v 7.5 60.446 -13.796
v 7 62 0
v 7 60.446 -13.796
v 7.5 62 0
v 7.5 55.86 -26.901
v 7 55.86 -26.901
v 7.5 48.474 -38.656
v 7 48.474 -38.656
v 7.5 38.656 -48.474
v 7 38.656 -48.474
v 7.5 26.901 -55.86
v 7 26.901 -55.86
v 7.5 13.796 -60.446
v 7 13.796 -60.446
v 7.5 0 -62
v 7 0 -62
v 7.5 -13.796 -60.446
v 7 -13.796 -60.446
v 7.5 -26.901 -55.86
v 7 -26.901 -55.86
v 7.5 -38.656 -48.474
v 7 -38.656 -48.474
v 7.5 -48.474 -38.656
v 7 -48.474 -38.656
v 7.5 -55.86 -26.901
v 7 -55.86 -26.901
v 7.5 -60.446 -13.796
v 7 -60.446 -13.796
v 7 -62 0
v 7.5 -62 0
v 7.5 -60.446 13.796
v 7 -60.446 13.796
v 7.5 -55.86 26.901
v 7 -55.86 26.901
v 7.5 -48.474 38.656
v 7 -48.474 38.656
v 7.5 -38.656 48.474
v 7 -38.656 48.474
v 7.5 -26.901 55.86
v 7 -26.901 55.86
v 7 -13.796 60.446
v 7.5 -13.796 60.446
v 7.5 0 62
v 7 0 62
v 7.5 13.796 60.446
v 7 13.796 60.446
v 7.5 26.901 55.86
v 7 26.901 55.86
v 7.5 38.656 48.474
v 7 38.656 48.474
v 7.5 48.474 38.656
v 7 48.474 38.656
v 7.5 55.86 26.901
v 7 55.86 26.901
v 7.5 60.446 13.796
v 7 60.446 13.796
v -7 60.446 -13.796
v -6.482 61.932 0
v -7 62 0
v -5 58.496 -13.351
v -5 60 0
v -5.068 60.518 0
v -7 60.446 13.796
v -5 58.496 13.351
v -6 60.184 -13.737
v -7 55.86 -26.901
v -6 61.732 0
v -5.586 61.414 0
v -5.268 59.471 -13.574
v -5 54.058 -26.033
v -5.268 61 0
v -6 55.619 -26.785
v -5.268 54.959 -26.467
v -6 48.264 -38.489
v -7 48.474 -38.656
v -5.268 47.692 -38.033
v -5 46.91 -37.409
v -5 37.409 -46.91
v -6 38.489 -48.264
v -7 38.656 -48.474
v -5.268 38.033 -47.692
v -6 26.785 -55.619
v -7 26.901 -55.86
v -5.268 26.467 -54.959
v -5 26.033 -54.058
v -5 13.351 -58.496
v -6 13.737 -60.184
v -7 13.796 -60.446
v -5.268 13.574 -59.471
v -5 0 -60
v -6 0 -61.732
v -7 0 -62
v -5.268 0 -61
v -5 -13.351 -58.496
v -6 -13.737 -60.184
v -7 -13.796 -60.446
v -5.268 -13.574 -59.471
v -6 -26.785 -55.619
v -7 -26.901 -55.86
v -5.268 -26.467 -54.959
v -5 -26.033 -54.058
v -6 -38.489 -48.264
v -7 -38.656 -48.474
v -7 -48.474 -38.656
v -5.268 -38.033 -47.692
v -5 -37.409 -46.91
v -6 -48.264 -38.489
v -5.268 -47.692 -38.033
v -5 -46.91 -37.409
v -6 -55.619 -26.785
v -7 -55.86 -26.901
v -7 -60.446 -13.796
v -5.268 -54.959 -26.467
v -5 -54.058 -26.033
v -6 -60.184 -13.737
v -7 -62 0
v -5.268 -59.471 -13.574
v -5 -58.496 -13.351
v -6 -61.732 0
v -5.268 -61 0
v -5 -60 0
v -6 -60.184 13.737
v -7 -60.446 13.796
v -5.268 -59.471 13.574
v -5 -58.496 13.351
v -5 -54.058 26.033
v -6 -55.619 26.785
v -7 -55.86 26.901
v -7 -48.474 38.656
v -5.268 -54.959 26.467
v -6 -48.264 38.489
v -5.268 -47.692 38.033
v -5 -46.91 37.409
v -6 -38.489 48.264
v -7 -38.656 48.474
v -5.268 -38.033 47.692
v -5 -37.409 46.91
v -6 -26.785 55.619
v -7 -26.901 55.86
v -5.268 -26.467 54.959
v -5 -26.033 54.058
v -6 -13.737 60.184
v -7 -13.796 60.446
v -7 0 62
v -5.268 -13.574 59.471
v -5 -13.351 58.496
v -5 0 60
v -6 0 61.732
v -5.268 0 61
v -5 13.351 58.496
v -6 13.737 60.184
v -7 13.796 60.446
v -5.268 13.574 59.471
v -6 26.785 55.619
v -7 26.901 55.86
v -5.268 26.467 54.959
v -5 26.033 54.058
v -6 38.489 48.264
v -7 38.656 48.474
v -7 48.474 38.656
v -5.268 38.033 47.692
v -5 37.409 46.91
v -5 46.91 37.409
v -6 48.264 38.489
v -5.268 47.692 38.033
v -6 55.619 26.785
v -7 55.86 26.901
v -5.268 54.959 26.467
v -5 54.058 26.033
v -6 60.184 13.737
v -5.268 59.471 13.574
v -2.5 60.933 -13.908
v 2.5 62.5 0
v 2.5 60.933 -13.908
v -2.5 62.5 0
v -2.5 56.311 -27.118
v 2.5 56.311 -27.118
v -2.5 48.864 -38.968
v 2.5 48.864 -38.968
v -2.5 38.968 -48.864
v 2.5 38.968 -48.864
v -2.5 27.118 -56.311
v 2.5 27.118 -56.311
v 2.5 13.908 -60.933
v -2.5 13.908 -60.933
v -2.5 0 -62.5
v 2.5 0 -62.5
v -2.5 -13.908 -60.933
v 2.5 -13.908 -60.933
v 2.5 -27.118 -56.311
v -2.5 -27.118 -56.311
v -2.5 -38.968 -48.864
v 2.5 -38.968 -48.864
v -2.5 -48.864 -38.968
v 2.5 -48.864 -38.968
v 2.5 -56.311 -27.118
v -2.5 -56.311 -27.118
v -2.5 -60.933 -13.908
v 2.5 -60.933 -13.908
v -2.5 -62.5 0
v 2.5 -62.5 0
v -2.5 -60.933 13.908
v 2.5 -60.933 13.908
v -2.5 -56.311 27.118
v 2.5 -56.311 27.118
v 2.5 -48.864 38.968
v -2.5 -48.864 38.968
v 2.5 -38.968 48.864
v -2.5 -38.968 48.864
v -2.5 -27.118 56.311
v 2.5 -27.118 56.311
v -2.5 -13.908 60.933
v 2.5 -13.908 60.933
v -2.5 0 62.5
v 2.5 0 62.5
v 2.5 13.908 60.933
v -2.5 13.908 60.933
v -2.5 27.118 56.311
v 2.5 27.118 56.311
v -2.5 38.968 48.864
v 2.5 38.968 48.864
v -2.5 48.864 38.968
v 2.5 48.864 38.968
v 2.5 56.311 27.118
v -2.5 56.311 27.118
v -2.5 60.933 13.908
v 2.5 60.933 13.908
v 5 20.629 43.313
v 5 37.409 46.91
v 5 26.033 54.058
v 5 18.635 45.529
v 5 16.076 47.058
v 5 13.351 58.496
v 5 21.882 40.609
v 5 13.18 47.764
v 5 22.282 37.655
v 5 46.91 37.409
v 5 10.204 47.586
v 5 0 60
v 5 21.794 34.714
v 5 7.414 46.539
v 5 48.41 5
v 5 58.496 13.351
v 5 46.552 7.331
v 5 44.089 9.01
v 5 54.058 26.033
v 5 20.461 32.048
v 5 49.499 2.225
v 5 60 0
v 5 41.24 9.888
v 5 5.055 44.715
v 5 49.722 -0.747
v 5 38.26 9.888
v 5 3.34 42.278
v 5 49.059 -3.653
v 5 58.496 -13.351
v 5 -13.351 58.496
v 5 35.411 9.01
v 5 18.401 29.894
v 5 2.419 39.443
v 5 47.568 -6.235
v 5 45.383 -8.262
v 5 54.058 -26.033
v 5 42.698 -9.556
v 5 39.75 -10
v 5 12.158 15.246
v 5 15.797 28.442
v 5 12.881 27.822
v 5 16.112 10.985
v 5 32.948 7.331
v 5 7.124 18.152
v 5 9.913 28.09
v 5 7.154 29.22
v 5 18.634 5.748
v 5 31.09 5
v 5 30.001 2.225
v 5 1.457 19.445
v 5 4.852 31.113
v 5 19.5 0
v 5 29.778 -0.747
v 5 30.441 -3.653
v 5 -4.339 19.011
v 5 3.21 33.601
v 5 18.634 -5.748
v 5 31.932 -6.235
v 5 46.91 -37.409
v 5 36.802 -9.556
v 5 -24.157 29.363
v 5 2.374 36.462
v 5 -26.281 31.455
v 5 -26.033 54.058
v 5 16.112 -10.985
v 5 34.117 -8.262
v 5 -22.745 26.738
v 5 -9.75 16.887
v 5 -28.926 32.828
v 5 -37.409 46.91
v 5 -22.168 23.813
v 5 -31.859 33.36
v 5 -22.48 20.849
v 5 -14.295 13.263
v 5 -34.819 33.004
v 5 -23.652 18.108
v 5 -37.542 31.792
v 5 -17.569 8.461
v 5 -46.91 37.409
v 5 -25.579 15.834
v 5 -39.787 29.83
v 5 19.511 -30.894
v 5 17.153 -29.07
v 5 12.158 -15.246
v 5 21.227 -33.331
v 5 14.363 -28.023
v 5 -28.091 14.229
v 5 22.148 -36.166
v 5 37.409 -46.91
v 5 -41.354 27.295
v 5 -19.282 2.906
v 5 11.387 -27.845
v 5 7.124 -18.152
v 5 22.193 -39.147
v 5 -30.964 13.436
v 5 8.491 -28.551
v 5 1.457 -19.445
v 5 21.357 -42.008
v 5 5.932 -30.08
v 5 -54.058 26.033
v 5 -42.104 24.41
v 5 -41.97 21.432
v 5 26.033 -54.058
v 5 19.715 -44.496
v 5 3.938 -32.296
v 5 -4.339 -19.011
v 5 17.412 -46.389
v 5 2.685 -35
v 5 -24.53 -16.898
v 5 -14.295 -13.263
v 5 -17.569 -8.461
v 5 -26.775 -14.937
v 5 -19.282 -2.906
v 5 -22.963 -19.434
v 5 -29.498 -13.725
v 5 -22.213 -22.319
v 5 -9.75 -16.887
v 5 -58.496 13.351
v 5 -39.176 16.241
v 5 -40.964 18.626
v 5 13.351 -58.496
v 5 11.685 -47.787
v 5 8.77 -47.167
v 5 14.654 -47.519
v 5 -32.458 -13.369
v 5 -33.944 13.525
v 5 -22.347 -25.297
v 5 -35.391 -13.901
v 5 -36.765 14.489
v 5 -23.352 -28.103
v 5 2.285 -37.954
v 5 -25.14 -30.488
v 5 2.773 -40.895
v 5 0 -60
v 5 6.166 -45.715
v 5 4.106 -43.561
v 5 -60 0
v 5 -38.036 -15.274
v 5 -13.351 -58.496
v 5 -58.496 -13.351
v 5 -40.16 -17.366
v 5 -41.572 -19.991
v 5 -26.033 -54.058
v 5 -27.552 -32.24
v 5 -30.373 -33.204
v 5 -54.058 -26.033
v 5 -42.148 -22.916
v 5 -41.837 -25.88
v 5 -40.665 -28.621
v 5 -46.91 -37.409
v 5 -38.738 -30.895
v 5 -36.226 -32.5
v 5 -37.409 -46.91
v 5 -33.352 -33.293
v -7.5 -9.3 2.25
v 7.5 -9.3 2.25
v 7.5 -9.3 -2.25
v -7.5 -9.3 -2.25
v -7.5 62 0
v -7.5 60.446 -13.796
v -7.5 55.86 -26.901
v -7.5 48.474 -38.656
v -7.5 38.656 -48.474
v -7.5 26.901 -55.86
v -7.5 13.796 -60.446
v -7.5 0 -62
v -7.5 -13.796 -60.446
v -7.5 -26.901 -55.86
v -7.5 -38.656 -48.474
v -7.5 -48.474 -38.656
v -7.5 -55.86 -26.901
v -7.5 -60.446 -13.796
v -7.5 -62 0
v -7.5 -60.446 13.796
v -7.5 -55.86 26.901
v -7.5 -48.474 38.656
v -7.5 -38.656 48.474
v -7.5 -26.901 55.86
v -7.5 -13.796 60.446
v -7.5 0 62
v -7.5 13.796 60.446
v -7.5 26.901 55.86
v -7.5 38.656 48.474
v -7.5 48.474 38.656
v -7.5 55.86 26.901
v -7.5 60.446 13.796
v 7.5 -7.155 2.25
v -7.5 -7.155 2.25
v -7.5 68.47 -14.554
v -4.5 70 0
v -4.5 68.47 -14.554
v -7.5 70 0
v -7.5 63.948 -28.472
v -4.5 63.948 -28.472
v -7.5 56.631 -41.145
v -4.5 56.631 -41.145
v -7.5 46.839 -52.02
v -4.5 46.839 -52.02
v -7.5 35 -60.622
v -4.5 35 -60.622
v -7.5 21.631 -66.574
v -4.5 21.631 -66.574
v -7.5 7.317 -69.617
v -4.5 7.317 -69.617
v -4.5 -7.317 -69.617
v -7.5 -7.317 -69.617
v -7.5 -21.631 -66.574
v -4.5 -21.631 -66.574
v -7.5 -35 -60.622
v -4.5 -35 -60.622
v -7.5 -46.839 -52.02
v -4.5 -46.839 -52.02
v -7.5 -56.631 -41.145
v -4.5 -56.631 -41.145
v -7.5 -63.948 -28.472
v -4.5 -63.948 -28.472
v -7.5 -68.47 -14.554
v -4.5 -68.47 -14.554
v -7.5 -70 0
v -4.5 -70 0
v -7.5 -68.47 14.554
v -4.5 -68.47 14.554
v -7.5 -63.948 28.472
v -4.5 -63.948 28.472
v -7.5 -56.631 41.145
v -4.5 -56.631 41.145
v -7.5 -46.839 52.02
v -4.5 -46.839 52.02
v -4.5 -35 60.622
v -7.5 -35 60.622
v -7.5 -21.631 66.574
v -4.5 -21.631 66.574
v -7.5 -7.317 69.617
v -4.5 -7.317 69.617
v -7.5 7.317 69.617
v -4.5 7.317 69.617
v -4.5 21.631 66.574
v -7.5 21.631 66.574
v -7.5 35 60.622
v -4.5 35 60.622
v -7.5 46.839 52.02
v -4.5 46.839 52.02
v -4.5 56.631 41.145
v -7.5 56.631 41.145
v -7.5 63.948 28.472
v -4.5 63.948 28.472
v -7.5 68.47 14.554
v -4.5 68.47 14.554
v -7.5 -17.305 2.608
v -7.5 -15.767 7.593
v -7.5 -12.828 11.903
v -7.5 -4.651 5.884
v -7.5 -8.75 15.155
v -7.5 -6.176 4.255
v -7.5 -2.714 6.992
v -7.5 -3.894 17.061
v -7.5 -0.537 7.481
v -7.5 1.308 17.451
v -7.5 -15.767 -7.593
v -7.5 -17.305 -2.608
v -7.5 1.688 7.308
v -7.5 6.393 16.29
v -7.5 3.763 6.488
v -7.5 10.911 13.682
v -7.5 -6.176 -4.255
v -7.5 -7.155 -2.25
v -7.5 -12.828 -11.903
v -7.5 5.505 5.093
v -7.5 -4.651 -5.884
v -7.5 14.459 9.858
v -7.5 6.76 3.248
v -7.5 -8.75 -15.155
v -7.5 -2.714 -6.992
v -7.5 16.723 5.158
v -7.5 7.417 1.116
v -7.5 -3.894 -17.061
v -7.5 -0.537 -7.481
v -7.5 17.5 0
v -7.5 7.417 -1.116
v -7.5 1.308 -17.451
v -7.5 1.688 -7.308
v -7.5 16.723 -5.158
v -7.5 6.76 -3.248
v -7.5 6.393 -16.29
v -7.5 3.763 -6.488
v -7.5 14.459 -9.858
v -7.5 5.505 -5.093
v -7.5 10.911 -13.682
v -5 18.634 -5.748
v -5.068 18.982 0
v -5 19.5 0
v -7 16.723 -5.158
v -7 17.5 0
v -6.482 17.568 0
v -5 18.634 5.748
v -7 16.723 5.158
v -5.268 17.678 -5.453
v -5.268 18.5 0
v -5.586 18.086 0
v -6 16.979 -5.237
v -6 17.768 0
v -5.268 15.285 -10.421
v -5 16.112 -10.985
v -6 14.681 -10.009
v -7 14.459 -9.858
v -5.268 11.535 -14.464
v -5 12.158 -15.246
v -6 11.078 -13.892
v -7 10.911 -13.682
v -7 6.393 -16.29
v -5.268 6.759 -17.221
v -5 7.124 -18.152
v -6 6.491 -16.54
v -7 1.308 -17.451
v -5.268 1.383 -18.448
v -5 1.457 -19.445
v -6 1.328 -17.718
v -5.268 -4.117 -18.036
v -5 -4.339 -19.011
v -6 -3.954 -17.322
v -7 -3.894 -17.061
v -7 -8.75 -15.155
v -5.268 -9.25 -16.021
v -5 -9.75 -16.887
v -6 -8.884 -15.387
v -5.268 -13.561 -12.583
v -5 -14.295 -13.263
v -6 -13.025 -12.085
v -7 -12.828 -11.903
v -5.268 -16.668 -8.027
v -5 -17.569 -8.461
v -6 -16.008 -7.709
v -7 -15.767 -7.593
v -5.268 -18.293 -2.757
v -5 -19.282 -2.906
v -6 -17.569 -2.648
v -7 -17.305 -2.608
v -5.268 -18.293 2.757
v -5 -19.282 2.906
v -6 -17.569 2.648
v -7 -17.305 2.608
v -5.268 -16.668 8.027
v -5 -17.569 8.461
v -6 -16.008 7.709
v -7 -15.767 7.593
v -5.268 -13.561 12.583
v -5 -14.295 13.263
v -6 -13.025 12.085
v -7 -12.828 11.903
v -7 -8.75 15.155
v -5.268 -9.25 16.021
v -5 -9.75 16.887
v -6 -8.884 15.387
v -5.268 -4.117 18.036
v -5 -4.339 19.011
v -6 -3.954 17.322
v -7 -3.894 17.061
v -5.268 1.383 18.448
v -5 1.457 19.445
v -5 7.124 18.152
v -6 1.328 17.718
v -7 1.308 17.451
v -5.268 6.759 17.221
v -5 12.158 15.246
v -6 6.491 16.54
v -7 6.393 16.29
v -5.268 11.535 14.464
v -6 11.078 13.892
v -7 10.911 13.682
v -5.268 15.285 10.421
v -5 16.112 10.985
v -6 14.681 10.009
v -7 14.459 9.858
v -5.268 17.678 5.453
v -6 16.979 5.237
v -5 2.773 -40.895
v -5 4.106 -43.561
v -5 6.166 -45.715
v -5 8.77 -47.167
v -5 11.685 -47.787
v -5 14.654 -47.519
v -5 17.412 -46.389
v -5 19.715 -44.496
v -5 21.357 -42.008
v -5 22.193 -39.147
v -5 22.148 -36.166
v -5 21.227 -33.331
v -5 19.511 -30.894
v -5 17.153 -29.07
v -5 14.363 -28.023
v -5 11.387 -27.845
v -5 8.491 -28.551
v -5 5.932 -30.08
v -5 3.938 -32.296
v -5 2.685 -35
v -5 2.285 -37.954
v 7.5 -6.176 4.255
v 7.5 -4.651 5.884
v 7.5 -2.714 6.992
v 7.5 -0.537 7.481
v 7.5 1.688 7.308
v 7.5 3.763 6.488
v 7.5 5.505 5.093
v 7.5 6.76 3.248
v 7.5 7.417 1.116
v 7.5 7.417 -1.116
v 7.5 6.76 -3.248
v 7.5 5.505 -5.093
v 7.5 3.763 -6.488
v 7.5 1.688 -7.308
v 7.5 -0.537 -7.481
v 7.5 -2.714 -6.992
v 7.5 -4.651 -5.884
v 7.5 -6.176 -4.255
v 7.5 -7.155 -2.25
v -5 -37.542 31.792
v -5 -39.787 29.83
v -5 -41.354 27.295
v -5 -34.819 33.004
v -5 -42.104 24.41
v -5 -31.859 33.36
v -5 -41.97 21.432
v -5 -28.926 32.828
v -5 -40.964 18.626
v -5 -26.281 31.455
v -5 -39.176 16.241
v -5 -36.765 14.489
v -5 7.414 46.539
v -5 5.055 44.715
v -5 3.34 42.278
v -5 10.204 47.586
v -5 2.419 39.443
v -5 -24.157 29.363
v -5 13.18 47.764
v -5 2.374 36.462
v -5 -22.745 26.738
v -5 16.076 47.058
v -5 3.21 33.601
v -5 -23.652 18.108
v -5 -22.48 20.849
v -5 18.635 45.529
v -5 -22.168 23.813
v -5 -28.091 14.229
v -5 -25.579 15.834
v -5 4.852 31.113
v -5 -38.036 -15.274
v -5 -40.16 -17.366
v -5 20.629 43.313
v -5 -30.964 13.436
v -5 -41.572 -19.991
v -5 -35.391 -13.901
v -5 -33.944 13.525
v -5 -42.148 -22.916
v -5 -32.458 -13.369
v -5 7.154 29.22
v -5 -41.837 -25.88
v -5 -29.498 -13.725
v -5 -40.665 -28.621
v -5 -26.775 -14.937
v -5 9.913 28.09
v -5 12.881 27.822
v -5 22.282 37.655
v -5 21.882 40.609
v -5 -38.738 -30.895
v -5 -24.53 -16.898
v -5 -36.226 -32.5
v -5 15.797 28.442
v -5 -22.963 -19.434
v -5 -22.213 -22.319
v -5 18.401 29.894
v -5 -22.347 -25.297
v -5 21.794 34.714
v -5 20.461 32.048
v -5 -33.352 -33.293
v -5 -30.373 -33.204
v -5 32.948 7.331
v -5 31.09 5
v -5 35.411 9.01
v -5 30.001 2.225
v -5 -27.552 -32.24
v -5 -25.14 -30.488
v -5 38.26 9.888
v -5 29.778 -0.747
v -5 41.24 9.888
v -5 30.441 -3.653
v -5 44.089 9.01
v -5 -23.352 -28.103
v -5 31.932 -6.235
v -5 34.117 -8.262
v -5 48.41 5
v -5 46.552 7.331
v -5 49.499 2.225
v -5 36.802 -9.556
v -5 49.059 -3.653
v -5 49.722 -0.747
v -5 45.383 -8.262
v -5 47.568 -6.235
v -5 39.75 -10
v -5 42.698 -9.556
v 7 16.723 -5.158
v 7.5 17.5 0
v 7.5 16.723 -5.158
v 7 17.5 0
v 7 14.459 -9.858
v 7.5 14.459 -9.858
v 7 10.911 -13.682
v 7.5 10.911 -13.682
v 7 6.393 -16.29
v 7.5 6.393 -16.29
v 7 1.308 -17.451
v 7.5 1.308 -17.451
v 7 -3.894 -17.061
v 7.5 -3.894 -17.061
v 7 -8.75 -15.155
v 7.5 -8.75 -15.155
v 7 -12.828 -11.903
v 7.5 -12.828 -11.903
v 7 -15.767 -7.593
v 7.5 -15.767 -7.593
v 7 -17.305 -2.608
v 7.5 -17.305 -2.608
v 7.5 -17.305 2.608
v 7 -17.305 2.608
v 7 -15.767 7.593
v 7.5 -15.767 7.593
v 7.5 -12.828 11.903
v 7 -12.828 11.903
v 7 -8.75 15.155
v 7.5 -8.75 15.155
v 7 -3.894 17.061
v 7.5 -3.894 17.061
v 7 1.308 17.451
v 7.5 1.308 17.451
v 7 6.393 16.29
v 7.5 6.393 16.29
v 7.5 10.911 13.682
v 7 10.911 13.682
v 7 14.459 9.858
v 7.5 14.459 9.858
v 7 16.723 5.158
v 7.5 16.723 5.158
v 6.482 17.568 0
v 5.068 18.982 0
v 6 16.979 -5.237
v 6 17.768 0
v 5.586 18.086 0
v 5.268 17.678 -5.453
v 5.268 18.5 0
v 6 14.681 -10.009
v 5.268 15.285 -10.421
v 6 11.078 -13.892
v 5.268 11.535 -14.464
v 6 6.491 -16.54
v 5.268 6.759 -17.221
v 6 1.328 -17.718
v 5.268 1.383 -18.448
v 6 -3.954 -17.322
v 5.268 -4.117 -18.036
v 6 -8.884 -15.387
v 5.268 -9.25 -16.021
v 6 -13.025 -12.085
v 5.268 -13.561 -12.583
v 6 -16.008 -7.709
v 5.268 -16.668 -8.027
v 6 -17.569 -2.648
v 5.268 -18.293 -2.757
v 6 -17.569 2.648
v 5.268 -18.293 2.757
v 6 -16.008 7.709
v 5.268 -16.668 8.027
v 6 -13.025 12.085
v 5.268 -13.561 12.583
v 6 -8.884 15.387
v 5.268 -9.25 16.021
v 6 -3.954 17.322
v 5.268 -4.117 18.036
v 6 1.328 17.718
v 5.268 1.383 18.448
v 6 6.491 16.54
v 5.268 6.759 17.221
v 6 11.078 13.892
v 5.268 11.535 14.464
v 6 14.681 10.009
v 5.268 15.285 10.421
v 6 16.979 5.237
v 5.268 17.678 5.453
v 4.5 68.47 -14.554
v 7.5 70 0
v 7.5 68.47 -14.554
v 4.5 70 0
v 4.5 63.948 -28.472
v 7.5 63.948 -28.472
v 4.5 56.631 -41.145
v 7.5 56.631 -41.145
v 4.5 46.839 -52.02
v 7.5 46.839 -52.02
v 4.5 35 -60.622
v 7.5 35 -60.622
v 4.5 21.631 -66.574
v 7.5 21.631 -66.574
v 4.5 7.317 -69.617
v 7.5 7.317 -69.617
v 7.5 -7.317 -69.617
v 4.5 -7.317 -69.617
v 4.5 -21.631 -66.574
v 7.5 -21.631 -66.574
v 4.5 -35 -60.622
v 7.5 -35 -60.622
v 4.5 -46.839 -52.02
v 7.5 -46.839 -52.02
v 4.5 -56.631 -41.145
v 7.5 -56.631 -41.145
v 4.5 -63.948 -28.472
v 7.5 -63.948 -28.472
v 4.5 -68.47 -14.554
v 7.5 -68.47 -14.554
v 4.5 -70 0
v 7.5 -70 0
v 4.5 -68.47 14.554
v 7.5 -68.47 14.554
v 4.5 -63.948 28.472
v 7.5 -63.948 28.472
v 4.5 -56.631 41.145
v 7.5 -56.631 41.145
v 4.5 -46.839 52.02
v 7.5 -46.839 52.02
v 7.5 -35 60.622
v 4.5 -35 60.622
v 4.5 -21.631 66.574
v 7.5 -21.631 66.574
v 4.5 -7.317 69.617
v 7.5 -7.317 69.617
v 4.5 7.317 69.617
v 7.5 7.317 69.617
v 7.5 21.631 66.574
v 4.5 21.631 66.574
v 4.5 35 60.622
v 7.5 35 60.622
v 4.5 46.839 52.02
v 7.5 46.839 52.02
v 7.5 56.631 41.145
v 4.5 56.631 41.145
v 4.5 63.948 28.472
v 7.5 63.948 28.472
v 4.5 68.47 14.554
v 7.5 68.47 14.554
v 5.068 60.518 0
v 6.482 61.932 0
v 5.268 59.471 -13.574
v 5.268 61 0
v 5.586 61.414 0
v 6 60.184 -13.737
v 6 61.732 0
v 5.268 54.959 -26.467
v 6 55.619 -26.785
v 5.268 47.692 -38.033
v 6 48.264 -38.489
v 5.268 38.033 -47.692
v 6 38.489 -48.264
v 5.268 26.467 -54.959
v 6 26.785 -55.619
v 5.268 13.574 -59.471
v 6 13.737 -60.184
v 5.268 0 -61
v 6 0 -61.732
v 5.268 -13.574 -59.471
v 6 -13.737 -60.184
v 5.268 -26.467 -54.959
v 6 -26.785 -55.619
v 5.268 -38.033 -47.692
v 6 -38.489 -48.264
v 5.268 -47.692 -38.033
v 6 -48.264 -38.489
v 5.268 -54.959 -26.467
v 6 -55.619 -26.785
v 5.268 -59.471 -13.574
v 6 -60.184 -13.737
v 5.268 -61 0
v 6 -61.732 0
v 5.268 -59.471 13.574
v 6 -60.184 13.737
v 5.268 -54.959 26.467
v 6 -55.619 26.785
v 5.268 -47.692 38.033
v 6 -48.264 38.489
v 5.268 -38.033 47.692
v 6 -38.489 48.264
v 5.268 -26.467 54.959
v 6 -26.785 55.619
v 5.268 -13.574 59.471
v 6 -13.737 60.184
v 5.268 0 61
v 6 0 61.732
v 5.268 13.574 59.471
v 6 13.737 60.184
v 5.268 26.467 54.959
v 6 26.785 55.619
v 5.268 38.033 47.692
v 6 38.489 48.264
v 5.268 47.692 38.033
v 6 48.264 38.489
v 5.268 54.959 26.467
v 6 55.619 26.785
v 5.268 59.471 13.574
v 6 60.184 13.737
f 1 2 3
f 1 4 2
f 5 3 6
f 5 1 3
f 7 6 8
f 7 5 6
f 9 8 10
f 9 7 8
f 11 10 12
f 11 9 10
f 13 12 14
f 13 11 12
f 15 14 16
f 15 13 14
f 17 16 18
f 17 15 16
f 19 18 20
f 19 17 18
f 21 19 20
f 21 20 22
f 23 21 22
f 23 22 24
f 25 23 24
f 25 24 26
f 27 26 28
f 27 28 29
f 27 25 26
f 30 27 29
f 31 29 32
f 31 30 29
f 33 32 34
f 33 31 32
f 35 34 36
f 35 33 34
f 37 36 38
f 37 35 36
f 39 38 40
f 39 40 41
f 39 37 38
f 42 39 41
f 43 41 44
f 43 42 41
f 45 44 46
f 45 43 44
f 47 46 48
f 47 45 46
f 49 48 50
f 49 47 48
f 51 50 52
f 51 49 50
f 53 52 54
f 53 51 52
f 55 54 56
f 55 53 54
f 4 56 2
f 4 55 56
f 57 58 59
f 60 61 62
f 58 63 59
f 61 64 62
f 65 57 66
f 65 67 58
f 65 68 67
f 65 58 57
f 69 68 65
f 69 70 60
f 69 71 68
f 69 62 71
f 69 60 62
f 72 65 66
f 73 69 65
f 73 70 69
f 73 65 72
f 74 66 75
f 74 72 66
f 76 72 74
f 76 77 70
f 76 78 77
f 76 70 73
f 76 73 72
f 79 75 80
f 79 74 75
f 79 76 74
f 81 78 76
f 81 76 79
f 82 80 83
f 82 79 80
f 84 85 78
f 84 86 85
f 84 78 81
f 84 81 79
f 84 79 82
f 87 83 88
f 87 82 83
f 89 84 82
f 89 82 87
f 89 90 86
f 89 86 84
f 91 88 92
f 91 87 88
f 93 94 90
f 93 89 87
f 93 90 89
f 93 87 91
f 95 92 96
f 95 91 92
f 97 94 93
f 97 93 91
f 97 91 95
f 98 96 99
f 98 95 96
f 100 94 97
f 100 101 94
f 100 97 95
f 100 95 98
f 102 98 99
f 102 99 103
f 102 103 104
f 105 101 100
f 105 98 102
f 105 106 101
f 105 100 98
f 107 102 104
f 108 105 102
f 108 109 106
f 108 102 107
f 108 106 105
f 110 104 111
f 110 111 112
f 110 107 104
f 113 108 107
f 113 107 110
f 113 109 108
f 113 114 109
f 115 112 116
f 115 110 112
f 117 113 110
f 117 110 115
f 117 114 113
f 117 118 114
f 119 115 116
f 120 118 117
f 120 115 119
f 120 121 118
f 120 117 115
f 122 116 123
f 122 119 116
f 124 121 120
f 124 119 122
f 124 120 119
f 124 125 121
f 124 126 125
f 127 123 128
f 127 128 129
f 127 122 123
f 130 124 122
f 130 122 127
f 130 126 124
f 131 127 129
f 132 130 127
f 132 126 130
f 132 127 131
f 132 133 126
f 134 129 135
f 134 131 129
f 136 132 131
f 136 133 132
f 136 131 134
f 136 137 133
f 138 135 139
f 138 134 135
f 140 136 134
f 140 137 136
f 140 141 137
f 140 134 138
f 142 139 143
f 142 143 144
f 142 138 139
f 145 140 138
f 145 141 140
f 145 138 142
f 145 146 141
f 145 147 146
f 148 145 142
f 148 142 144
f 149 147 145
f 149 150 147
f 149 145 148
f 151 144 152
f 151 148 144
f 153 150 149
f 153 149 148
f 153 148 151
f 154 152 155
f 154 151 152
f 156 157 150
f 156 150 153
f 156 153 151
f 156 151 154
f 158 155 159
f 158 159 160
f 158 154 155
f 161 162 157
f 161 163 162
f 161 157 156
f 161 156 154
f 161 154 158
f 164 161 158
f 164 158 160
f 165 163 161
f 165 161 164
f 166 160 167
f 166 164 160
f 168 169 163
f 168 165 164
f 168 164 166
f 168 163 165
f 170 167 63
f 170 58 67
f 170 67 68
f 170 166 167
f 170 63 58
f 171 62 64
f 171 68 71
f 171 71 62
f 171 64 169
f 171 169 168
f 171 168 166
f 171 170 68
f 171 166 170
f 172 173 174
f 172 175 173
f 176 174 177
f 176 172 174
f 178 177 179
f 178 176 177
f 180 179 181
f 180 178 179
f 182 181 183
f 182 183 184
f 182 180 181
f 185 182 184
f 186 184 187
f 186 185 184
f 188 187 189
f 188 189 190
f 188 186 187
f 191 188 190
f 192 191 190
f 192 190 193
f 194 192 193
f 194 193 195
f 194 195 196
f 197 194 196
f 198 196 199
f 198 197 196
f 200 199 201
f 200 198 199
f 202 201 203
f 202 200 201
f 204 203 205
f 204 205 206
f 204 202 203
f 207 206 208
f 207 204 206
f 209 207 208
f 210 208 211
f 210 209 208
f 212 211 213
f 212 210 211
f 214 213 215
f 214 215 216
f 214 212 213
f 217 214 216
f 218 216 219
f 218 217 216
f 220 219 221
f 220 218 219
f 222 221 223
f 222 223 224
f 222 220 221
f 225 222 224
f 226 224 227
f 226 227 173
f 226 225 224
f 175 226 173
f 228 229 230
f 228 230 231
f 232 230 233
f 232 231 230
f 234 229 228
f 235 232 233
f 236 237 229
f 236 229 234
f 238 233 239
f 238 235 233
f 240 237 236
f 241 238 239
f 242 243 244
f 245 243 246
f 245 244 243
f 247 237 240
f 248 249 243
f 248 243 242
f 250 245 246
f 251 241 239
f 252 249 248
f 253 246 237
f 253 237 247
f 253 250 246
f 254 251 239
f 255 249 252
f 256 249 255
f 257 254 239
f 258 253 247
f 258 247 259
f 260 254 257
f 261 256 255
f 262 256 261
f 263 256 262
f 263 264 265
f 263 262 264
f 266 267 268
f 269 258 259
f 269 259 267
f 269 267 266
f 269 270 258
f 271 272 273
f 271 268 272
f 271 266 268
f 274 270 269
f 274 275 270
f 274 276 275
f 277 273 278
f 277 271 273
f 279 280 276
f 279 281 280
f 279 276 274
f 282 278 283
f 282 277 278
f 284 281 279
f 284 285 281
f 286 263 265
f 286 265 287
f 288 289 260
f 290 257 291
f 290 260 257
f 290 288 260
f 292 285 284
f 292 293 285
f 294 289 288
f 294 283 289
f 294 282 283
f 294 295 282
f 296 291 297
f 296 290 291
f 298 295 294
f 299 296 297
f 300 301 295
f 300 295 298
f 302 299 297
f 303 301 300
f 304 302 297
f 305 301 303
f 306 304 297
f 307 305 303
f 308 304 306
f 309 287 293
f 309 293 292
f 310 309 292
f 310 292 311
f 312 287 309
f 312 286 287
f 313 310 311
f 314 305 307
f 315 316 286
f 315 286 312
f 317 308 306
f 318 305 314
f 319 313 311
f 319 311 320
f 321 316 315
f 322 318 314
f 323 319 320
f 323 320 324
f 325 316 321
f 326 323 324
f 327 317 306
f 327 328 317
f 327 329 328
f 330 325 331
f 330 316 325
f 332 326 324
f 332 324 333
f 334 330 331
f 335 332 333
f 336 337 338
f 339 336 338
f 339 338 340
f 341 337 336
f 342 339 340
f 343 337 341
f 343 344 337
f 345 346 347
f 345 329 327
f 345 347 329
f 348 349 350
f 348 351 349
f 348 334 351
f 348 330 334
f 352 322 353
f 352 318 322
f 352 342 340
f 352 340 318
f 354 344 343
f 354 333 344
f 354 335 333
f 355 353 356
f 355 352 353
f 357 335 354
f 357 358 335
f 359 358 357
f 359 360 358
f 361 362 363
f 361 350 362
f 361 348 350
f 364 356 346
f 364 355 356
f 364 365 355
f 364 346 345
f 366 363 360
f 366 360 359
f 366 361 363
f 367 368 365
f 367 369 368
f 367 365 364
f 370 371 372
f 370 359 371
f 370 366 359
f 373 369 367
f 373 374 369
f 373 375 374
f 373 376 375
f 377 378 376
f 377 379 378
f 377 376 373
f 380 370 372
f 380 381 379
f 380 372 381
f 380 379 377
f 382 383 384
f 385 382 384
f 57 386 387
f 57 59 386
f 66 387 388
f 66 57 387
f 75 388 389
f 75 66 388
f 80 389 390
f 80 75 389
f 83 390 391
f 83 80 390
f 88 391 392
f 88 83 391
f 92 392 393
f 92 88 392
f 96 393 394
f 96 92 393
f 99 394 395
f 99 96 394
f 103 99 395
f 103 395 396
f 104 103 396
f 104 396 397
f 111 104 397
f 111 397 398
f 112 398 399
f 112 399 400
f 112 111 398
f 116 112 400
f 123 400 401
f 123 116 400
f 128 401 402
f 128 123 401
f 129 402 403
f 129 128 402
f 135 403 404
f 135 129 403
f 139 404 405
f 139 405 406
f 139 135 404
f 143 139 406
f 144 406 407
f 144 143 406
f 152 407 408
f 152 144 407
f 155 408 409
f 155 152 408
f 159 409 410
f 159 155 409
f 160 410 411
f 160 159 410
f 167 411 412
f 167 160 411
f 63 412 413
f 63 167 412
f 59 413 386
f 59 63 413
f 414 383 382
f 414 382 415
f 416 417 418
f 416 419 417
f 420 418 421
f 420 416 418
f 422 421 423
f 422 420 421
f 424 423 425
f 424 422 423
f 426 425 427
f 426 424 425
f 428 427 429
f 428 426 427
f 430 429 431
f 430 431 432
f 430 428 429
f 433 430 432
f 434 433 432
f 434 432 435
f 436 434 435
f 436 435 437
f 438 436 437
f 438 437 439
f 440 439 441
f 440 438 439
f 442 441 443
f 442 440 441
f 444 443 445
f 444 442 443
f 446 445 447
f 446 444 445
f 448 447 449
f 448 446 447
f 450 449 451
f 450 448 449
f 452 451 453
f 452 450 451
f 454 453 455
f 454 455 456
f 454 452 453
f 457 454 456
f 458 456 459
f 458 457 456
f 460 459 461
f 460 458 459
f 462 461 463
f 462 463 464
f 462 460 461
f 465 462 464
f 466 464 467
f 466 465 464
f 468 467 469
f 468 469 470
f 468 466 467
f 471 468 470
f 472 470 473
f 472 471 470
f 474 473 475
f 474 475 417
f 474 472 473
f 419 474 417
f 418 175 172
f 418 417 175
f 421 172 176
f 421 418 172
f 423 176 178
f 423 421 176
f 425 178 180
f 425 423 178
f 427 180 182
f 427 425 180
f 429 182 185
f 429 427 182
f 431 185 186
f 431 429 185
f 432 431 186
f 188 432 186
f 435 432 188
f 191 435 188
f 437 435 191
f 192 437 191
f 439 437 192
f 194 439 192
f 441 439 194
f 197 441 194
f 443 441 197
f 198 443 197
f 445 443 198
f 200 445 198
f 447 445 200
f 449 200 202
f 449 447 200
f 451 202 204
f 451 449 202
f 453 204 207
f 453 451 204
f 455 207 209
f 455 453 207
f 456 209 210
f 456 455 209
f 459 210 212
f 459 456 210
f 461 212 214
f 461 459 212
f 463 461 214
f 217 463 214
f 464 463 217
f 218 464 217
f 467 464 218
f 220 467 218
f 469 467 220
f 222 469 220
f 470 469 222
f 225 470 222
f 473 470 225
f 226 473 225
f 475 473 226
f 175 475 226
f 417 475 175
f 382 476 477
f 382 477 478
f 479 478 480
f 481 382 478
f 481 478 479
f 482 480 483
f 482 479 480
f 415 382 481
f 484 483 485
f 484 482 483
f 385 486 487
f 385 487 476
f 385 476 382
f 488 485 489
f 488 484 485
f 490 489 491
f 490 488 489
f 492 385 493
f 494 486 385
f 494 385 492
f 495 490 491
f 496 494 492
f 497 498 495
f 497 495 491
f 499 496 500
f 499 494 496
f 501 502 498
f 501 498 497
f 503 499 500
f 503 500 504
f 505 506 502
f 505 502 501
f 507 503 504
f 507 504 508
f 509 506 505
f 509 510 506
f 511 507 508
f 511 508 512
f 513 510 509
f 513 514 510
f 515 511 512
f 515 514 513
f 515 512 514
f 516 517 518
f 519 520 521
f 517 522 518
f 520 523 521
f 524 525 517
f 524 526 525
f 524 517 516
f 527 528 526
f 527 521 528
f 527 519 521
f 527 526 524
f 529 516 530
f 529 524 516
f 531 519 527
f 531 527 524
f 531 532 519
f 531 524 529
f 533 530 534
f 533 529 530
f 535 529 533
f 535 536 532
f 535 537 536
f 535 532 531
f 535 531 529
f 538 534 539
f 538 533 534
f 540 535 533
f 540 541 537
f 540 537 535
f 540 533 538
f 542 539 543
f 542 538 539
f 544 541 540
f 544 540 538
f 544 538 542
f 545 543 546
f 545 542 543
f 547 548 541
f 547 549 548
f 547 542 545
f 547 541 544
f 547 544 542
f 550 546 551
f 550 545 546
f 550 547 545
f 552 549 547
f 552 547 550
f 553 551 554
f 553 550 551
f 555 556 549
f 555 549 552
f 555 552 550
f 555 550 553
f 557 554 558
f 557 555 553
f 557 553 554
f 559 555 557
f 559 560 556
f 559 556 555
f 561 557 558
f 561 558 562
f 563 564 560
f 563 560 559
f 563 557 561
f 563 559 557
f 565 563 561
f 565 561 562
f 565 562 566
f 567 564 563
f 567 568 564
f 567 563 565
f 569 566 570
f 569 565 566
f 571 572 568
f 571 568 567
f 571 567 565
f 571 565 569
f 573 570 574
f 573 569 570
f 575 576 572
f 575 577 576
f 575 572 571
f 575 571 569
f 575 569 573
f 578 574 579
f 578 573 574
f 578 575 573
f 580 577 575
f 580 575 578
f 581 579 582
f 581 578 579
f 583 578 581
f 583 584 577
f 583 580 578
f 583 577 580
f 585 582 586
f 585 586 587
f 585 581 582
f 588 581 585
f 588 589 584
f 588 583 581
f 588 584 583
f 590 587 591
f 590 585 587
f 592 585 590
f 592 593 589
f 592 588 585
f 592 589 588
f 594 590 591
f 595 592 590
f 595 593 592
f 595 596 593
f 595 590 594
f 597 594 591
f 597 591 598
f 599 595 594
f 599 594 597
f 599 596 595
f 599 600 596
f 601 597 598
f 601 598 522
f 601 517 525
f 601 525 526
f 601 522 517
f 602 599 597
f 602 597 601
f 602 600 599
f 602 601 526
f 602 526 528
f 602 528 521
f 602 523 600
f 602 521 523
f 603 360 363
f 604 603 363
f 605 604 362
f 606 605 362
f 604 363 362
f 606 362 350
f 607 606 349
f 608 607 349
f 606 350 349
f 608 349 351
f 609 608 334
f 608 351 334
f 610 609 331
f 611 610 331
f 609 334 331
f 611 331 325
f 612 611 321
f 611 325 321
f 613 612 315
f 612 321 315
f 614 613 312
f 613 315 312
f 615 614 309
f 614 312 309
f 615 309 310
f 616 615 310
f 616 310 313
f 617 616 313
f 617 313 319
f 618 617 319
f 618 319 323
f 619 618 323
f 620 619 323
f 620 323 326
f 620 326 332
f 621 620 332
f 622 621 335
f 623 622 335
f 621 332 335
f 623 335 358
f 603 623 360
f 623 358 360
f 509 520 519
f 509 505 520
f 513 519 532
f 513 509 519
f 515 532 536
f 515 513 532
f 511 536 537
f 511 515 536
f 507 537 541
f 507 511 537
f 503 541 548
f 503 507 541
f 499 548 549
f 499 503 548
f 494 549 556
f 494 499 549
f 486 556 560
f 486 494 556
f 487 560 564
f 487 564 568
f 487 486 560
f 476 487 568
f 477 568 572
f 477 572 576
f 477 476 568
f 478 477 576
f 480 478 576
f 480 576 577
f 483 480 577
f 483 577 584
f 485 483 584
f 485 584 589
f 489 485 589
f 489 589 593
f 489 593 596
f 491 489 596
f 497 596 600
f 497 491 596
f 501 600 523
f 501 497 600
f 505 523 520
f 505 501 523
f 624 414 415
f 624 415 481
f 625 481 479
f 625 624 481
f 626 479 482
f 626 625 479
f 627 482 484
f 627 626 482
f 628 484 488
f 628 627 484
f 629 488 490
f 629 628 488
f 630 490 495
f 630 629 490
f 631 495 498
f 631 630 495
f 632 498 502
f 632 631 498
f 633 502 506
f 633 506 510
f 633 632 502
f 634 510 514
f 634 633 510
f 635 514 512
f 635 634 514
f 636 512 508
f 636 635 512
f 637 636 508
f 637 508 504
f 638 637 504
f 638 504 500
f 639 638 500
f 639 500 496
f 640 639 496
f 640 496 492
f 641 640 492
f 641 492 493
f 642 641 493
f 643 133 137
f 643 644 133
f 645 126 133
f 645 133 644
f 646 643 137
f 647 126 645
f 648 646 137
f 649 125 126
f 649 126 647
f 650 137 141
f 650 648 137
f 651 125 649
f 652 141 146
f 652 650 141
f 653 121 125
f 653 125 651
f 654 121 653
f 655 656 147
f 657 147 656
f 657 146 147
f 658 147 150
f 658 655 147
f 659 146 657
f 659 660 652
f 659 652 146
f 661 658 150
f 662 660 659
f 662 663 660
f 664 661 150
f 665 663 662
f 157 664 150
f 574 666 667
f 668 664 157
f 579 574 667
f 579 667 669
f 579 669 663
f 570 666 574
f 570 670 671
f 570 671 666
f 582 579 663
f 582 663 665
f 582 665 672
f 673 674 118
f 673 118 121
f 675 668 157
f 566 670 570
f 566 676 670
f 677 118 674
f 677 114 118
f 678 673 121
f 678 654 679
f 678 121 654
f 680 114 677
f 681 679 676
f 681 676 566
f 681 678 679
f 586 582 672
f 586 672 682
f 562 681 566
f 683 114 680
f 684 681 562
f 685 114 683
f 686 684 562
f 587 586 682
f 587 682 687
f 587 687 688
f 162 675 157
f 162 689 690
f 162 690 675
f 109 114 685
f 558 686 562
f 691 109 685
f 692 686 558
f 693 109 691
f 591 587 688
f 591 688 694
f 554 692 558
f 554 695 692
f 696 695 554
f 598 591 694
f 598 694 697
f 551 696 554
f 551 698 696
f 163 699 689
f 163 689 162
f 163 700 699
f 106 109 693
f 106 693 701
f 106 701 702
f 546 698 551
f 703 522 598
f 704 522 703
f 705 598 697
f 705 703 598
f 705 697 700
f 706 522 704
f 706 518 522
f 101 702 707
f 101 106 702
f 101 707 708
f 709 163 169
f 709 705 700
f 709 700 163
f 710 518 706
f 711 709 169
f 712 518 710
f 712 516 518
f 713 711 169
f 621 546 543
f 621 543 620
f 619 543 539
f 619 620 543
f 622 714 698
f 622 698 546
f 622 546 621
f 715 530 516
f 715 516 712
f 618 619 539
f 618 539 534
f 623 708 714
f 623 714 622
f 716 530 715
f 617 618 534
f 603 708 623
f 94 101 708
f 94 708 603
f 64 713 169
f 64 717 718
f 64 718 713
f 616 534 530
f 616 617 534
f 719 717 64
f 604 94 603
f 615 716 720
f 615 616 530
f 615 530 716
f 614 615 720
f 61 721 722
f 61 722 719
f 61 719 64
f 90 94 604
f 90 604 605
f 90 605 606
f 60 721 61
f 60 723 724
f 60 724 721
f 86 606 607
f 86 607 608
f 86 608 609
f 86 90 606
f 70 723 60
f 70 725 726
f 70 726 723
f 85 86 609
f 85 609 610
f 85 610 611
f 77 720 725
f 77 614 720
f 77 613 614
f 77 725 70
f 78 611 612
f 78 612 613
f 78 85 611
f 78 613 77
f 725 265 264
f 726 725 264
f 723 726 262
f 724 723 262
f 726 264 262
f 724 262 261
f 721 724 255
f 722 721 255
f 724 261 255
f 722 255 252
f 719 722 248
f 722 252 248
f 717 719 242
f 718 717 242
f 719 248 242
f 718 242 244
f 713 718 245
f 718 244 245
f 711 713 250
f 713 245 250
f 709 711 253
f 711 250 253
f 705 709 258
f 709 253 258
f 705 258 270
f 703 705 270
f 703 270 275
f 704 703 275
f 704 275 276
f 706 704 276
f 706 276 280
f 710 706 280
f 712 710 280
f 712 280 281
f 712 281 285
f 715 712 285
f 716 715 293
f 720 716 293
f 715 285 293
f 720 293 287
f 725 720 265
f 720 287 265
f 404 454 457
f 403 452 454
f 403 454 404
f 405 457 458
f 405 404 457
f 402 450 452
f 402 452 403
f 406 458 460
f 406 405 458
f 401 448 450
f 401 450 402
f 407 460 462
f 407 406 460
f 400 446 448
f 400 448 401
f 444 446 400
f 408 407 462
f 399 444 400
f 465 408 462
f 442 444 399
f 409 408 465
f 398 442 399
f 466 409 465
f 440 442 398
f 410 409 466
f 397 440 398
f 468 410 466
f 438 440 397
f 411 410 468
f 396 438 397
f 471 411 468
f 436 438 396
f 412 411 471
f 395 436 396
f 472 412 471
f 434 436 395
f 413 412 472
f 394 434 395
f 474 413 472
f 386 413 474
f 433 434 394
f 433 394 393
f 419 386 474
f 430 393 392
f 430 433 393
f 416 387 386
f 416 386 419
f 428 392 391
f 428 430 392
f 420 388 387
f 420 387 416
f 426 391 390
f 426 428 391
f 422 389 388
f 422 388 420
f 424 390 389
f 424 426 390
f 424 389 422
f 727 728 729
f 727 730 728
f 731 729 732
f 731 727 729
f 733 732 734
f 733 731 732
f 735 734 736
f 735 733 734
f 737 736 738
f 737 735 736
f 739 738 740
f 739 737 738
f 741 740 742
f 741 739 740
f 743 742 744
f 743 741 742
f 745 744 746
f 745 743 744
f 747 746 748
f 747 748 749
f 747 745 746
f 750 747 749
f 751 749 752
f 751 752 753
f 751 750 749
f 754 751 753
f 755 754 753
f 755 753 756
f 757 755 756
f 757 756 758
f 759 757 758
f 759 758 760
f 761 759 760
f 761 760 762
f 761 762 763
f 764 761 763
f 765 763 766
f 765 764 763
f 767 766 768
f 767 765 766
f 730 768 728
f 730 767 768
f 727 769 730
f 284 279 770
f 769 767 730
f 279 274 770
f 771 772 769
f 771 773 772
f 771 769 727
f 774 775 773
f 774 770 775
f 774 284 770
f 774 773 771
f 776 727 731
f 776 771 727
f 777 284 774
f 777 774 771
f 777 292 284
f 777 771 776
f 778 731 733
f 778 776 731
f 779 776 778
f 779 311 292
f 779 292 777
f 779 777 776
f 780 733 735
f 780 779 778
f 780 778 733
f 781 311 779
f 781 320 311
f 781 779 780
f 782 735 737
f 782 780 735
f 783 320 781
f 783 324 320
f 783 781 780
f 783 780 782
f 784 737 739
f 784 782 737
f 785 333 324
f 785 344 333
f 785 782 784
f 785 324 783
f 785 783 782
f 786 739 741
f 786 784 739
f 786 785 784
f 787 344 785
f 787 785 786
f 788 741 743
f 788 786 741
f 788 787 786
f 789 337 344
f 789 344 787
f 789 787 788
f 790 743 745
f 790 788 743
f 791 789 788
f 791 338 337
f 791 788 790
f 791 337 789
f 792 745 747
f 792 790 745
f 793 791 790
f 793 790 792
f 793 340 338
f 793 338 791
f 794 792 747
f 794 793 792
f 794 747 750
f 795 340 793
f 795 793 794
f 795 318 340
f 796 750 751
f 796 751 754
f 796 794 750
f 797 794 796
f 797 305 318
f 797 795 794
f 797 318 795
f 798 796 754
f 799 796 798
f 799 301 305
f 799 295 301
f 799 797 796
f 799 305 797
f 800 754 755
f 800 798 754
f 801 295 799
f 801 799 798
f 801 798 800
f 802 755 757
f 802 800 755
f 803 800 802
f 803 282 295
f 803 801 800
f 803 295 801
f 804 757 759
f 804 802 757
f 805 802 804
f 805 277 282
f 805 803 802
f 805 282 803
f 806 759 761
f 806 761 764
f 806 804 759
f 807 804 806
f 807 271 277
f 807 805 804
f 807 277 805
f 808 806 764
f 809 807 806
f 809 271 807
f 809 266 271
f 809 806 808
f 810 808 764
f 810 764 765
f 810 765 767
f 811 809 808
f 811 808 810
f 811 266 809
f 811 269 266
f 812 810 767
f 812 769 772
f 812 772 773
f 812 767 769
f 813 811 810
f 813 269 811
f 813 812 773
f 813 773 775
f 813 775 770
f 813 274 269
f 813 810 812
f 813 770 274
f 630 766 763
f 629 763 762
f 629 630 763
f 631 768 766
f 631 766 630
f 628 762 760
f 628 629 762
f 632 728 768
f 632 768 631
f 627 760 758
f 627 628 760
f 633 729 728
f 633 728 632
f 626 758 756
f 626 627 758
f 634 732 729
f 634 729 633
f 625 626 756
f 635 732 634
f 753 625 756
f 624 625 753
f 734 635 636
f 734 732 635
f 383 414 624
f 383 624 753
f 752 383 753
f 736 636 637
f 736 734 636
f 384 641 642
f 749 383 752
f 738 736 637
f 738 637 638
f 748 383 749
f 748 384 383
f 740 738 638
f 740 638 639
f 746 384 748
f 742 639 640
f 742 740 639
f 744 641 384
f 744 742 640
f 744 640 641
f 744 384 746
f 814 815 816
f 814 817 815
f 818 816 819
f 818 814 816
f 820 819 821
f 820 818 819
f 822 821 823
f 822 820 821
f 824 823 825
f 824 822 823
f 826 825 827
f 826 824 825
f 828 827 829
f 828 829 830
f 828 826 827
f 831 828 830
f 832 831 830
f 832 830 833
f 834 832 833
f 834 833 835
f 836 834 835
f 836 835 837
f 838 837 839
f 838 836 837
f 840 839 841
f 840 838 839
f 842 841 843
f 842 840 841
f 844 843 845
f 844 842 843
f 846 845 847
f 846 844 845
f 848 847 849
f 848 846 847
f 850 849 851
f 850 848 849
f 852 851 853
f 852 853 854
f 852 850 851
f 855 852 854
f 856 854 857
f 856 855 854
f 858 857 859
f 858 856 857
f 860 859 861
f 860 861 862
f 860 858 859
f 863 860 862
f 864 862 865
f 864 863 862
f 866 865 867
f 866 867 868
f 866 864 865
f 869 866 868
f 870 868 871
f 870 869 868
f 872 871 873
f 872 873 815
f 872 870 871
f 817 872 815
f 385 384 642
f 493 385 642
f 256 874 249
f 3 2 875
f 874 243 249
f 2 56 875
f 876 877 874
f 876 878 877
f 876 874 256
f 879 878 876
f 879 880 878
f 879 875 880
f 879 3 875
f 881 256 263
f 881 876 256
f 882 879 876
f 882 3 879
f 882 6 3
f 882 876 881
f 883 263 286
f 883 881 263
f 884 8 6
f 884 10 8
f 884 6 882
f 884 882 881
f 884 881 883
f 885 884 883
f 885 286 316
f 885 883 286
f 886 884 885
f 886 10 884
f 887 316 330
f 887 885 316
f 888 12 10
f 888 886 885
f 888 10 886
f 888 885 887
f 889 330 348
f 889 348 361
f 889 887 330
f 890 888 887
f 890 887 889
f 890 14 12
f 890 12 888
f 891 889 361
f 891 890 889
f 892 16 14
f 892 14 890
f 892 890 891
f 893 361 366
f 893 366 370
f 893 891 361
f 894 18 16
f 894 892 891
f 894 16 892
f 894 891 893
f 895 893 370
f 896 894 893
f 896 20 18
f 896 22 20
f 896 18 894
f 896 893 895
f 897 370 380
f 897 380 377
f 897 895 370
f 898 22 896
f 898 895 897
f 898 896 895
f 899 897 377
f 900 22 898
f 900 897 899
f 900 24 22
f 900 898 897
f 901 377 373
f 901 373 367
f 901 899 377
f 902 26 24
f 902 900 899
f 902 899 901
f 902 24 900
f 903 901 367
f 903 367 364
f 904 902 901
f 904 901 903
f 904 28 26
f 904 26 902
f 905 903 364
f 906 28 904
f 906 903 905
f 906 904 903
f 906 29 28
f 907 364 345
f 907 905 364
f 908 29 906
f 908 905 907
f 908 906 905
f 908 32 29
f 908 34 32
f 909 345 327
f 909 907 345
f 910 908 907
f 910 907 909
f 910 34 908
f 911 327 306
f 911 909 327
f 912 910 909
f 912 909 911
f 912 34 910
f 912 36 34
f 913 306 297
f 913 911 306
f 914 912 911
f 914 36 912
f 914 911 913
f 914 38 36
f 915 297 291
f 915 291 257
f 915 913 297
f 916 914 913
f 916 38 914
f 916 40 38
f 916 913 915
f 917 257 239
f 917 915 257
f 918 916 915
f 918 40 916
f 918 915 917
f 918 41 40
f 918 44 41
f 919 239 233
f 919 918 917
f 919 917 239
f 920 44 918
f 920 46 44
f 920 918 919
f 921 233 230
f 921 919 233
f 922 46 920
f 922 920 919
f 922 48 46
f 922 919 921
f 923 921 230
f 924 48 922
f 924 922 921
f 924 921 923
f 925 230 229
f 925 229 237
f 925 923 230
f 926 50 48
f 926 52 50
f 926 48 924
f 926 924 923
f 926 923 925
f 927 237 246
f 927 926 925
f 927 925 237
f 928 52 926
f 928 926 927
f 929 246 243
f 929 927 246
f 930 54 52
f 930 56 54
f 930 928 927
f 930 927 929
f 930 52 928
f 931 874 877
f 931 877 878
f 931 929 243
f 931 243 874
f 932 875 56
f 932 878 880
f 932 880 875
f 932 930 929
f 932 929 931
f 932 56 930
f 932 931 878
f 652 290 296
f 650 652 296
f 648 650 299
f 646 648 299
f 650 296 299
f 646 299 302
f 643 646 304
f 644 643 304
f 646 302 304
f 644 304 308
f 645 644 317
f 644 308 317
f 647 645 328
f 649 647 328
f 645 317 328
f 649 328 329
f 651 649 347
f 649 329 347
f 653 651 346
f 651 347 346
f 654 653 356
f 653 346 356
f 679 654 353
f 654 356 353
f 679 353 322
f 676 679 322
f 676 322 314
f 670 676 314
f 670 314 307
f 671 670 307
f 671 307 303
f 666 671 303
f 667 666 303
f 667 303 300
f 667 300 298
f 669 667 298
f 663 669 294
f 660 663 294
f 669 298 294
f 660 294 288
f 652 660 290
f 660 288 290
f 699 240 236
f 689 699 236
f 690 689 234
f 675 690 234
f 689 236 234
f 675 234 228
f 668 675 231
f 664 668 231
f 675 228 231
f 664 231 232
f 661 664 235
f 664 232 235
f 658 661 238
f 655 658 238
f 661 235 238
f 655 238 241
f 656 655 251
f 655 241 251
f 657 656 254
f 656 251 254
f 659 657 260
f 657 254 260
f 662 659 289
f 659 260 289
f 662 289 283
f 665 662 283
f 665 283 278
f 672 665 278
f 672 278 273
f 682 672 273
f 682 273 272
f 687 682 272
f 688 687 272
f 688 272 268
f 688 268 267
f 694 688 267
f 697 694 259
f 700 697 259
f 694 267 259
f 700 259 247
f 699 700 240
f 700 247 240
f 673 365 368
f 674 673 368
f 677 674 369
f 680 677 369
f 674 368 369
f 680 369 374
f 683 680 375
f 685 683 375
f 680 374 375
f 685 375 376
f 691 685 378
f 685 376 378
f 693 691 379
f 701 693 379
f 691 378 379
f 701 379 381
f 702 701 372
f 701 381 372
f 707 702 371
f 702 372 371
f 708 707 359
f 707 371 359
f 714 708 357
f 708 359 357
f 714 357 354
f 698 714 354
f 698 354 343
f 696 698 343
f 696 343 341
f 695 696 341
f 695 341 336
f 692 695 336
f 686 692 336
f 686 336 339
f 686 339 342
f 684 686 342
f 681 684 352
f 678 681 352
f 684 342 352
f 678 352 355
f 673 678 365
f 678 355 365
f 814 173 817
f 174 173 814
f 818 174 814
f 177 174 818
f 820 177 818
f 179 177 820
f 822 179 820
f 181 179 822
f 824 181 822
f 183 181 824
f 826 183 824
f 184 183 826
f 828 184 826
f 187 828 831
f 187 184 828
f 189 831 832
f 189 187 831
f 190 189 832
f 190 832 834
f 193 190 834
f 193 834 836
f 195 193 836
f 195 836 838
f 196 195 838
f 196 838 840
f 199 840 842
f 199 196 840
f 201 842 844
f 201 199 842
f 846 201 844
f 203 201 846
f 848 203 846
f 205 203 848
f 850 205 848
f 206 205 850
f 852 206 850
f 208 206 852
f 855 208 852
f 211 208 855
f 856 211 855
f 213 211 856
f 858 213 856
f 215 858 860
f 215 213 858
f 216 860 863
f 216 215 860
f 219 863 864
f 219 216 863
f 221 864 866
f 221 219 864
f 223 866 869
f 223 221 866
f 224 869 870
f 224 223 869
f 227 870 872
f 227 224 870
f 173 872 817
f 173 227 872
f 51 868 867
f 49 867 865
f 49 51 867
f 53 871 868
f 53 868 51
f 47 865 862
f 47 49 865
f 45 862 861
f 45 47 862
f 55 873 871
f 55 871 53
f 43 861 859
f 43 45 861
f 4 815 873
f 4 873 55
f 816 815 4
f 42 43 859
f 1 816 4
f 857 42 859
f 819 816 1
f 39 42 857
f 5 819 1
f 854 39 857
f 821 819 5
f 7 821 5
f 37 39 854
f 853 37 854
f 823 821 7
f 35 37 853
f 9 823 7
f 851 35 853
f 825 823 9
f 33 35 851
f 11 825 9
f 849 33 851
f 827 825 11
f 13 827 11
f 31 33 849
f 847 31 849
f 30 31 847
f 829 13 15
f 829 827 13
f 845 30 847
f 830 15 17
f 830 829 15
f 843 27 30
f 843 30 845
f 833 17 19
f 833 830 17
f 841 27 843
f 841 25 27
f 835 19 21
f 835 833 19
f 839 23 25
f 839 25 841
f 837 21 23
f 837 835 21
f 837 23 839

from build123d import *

# Parameters (mm, degrees)
SKETCH2_R         = 10
EXTRUDE1_DEPTH    = 10
CIRPATTERN1_COUNT = 5
SKETCH3_W         = 4.5
SKETCH3_H         = 2.3
EXTRUDE2_DEPTH    = 16


with BuildPart() as part:
    # Sketch1 → Revolve1 (revolve)
    with BuildSketch(Plane.XY):
        with BuildLine():
            Line((-7.5, 7.5), (7.5, 7.5))
            Line((7.5, 7.5), (7.5, 17.5))
            Line((7.5, 17.5), (7, 17.5))
            ThreePointArc((7, 17.5), (5.585786438, 18.085786438), (5, 19.5))
            Line((5, 19.5), (5, 60))
            ThreePointArc((5, 60), (5.585786438, 61.414213562), (7, 62))
            Line((7, 62), (7.5, 62))
            Line((7.5, 62), (7.5, 70))
            Line((7.5, 70), (4.5, 70))
            Line((4.5, 70), (2.5, 62.5))
            Line((2.5, 62.5), (-2.5, 62.5))
            Line((-2.5, 62.5), (-4.5, 70))
            Line((-4.5, 70), (-7.5, 70))
            Line((-7.5, 70), (-7.5, 62))
            Line((-7.5, 62), (-7, 62))
            ThreePointArc((-7, 62), (-5.585786438, 61.414213562), (-5, 60))
            Line((-5, 60), (-5, 19.5))
            ThreePointArc((-5, 19.5), (-5.585786438, 18.085786438), (-7, 17.5))
            Line((-7, 17.5), (-7.5, 17.5))
            Line((-7.5, 17.5), (-7.5, 7.5))
        make_face()
    revolve(axis=Axis((25.864037296, 0, 0), (-1, 0, 0)))

    # Sketch2 → Extrude1 (cut)
    with BuildSketch(Plane(origin=(5, 0, 0), x_dir=(0, 0, -1), z_dir=(1, 0, 0))):
        with Locations((0, 39.75)):
            Circle(SKETCH2_R)
    extrude1 = extrude(amount=-EXTRUDE1_DEPTH, mode=Mode.SUBTRACT)

    # CirPattern1: Extrude1 ×5 about axis
    cirpattern1_axis = Axis((0, 0, 0), (1, 0, 0))
    for i in range(1, CIRPATTERN1_COUNT):
        add(extrude1.rotate(cirpattern1_axis, i * 360 / CIRPATTERN1_COUNT), mode=Mode.SUBTRACT)

    # Sketch3 → Extrude2 (cut, through all)
    with BuildSketch(Plane(origin=(7.5, 0, 0), x_dir=(0, 0, -1), z_dir=(1, 0, 0))):
        with Locations((0, -8.15)):
            Rectangle(SKETCH3_W, SKETCH3_H)
    extrude(amount=-EXTRUDE2_DEPTH, mode=Mode.SUBTRACT)


solid = part.part
